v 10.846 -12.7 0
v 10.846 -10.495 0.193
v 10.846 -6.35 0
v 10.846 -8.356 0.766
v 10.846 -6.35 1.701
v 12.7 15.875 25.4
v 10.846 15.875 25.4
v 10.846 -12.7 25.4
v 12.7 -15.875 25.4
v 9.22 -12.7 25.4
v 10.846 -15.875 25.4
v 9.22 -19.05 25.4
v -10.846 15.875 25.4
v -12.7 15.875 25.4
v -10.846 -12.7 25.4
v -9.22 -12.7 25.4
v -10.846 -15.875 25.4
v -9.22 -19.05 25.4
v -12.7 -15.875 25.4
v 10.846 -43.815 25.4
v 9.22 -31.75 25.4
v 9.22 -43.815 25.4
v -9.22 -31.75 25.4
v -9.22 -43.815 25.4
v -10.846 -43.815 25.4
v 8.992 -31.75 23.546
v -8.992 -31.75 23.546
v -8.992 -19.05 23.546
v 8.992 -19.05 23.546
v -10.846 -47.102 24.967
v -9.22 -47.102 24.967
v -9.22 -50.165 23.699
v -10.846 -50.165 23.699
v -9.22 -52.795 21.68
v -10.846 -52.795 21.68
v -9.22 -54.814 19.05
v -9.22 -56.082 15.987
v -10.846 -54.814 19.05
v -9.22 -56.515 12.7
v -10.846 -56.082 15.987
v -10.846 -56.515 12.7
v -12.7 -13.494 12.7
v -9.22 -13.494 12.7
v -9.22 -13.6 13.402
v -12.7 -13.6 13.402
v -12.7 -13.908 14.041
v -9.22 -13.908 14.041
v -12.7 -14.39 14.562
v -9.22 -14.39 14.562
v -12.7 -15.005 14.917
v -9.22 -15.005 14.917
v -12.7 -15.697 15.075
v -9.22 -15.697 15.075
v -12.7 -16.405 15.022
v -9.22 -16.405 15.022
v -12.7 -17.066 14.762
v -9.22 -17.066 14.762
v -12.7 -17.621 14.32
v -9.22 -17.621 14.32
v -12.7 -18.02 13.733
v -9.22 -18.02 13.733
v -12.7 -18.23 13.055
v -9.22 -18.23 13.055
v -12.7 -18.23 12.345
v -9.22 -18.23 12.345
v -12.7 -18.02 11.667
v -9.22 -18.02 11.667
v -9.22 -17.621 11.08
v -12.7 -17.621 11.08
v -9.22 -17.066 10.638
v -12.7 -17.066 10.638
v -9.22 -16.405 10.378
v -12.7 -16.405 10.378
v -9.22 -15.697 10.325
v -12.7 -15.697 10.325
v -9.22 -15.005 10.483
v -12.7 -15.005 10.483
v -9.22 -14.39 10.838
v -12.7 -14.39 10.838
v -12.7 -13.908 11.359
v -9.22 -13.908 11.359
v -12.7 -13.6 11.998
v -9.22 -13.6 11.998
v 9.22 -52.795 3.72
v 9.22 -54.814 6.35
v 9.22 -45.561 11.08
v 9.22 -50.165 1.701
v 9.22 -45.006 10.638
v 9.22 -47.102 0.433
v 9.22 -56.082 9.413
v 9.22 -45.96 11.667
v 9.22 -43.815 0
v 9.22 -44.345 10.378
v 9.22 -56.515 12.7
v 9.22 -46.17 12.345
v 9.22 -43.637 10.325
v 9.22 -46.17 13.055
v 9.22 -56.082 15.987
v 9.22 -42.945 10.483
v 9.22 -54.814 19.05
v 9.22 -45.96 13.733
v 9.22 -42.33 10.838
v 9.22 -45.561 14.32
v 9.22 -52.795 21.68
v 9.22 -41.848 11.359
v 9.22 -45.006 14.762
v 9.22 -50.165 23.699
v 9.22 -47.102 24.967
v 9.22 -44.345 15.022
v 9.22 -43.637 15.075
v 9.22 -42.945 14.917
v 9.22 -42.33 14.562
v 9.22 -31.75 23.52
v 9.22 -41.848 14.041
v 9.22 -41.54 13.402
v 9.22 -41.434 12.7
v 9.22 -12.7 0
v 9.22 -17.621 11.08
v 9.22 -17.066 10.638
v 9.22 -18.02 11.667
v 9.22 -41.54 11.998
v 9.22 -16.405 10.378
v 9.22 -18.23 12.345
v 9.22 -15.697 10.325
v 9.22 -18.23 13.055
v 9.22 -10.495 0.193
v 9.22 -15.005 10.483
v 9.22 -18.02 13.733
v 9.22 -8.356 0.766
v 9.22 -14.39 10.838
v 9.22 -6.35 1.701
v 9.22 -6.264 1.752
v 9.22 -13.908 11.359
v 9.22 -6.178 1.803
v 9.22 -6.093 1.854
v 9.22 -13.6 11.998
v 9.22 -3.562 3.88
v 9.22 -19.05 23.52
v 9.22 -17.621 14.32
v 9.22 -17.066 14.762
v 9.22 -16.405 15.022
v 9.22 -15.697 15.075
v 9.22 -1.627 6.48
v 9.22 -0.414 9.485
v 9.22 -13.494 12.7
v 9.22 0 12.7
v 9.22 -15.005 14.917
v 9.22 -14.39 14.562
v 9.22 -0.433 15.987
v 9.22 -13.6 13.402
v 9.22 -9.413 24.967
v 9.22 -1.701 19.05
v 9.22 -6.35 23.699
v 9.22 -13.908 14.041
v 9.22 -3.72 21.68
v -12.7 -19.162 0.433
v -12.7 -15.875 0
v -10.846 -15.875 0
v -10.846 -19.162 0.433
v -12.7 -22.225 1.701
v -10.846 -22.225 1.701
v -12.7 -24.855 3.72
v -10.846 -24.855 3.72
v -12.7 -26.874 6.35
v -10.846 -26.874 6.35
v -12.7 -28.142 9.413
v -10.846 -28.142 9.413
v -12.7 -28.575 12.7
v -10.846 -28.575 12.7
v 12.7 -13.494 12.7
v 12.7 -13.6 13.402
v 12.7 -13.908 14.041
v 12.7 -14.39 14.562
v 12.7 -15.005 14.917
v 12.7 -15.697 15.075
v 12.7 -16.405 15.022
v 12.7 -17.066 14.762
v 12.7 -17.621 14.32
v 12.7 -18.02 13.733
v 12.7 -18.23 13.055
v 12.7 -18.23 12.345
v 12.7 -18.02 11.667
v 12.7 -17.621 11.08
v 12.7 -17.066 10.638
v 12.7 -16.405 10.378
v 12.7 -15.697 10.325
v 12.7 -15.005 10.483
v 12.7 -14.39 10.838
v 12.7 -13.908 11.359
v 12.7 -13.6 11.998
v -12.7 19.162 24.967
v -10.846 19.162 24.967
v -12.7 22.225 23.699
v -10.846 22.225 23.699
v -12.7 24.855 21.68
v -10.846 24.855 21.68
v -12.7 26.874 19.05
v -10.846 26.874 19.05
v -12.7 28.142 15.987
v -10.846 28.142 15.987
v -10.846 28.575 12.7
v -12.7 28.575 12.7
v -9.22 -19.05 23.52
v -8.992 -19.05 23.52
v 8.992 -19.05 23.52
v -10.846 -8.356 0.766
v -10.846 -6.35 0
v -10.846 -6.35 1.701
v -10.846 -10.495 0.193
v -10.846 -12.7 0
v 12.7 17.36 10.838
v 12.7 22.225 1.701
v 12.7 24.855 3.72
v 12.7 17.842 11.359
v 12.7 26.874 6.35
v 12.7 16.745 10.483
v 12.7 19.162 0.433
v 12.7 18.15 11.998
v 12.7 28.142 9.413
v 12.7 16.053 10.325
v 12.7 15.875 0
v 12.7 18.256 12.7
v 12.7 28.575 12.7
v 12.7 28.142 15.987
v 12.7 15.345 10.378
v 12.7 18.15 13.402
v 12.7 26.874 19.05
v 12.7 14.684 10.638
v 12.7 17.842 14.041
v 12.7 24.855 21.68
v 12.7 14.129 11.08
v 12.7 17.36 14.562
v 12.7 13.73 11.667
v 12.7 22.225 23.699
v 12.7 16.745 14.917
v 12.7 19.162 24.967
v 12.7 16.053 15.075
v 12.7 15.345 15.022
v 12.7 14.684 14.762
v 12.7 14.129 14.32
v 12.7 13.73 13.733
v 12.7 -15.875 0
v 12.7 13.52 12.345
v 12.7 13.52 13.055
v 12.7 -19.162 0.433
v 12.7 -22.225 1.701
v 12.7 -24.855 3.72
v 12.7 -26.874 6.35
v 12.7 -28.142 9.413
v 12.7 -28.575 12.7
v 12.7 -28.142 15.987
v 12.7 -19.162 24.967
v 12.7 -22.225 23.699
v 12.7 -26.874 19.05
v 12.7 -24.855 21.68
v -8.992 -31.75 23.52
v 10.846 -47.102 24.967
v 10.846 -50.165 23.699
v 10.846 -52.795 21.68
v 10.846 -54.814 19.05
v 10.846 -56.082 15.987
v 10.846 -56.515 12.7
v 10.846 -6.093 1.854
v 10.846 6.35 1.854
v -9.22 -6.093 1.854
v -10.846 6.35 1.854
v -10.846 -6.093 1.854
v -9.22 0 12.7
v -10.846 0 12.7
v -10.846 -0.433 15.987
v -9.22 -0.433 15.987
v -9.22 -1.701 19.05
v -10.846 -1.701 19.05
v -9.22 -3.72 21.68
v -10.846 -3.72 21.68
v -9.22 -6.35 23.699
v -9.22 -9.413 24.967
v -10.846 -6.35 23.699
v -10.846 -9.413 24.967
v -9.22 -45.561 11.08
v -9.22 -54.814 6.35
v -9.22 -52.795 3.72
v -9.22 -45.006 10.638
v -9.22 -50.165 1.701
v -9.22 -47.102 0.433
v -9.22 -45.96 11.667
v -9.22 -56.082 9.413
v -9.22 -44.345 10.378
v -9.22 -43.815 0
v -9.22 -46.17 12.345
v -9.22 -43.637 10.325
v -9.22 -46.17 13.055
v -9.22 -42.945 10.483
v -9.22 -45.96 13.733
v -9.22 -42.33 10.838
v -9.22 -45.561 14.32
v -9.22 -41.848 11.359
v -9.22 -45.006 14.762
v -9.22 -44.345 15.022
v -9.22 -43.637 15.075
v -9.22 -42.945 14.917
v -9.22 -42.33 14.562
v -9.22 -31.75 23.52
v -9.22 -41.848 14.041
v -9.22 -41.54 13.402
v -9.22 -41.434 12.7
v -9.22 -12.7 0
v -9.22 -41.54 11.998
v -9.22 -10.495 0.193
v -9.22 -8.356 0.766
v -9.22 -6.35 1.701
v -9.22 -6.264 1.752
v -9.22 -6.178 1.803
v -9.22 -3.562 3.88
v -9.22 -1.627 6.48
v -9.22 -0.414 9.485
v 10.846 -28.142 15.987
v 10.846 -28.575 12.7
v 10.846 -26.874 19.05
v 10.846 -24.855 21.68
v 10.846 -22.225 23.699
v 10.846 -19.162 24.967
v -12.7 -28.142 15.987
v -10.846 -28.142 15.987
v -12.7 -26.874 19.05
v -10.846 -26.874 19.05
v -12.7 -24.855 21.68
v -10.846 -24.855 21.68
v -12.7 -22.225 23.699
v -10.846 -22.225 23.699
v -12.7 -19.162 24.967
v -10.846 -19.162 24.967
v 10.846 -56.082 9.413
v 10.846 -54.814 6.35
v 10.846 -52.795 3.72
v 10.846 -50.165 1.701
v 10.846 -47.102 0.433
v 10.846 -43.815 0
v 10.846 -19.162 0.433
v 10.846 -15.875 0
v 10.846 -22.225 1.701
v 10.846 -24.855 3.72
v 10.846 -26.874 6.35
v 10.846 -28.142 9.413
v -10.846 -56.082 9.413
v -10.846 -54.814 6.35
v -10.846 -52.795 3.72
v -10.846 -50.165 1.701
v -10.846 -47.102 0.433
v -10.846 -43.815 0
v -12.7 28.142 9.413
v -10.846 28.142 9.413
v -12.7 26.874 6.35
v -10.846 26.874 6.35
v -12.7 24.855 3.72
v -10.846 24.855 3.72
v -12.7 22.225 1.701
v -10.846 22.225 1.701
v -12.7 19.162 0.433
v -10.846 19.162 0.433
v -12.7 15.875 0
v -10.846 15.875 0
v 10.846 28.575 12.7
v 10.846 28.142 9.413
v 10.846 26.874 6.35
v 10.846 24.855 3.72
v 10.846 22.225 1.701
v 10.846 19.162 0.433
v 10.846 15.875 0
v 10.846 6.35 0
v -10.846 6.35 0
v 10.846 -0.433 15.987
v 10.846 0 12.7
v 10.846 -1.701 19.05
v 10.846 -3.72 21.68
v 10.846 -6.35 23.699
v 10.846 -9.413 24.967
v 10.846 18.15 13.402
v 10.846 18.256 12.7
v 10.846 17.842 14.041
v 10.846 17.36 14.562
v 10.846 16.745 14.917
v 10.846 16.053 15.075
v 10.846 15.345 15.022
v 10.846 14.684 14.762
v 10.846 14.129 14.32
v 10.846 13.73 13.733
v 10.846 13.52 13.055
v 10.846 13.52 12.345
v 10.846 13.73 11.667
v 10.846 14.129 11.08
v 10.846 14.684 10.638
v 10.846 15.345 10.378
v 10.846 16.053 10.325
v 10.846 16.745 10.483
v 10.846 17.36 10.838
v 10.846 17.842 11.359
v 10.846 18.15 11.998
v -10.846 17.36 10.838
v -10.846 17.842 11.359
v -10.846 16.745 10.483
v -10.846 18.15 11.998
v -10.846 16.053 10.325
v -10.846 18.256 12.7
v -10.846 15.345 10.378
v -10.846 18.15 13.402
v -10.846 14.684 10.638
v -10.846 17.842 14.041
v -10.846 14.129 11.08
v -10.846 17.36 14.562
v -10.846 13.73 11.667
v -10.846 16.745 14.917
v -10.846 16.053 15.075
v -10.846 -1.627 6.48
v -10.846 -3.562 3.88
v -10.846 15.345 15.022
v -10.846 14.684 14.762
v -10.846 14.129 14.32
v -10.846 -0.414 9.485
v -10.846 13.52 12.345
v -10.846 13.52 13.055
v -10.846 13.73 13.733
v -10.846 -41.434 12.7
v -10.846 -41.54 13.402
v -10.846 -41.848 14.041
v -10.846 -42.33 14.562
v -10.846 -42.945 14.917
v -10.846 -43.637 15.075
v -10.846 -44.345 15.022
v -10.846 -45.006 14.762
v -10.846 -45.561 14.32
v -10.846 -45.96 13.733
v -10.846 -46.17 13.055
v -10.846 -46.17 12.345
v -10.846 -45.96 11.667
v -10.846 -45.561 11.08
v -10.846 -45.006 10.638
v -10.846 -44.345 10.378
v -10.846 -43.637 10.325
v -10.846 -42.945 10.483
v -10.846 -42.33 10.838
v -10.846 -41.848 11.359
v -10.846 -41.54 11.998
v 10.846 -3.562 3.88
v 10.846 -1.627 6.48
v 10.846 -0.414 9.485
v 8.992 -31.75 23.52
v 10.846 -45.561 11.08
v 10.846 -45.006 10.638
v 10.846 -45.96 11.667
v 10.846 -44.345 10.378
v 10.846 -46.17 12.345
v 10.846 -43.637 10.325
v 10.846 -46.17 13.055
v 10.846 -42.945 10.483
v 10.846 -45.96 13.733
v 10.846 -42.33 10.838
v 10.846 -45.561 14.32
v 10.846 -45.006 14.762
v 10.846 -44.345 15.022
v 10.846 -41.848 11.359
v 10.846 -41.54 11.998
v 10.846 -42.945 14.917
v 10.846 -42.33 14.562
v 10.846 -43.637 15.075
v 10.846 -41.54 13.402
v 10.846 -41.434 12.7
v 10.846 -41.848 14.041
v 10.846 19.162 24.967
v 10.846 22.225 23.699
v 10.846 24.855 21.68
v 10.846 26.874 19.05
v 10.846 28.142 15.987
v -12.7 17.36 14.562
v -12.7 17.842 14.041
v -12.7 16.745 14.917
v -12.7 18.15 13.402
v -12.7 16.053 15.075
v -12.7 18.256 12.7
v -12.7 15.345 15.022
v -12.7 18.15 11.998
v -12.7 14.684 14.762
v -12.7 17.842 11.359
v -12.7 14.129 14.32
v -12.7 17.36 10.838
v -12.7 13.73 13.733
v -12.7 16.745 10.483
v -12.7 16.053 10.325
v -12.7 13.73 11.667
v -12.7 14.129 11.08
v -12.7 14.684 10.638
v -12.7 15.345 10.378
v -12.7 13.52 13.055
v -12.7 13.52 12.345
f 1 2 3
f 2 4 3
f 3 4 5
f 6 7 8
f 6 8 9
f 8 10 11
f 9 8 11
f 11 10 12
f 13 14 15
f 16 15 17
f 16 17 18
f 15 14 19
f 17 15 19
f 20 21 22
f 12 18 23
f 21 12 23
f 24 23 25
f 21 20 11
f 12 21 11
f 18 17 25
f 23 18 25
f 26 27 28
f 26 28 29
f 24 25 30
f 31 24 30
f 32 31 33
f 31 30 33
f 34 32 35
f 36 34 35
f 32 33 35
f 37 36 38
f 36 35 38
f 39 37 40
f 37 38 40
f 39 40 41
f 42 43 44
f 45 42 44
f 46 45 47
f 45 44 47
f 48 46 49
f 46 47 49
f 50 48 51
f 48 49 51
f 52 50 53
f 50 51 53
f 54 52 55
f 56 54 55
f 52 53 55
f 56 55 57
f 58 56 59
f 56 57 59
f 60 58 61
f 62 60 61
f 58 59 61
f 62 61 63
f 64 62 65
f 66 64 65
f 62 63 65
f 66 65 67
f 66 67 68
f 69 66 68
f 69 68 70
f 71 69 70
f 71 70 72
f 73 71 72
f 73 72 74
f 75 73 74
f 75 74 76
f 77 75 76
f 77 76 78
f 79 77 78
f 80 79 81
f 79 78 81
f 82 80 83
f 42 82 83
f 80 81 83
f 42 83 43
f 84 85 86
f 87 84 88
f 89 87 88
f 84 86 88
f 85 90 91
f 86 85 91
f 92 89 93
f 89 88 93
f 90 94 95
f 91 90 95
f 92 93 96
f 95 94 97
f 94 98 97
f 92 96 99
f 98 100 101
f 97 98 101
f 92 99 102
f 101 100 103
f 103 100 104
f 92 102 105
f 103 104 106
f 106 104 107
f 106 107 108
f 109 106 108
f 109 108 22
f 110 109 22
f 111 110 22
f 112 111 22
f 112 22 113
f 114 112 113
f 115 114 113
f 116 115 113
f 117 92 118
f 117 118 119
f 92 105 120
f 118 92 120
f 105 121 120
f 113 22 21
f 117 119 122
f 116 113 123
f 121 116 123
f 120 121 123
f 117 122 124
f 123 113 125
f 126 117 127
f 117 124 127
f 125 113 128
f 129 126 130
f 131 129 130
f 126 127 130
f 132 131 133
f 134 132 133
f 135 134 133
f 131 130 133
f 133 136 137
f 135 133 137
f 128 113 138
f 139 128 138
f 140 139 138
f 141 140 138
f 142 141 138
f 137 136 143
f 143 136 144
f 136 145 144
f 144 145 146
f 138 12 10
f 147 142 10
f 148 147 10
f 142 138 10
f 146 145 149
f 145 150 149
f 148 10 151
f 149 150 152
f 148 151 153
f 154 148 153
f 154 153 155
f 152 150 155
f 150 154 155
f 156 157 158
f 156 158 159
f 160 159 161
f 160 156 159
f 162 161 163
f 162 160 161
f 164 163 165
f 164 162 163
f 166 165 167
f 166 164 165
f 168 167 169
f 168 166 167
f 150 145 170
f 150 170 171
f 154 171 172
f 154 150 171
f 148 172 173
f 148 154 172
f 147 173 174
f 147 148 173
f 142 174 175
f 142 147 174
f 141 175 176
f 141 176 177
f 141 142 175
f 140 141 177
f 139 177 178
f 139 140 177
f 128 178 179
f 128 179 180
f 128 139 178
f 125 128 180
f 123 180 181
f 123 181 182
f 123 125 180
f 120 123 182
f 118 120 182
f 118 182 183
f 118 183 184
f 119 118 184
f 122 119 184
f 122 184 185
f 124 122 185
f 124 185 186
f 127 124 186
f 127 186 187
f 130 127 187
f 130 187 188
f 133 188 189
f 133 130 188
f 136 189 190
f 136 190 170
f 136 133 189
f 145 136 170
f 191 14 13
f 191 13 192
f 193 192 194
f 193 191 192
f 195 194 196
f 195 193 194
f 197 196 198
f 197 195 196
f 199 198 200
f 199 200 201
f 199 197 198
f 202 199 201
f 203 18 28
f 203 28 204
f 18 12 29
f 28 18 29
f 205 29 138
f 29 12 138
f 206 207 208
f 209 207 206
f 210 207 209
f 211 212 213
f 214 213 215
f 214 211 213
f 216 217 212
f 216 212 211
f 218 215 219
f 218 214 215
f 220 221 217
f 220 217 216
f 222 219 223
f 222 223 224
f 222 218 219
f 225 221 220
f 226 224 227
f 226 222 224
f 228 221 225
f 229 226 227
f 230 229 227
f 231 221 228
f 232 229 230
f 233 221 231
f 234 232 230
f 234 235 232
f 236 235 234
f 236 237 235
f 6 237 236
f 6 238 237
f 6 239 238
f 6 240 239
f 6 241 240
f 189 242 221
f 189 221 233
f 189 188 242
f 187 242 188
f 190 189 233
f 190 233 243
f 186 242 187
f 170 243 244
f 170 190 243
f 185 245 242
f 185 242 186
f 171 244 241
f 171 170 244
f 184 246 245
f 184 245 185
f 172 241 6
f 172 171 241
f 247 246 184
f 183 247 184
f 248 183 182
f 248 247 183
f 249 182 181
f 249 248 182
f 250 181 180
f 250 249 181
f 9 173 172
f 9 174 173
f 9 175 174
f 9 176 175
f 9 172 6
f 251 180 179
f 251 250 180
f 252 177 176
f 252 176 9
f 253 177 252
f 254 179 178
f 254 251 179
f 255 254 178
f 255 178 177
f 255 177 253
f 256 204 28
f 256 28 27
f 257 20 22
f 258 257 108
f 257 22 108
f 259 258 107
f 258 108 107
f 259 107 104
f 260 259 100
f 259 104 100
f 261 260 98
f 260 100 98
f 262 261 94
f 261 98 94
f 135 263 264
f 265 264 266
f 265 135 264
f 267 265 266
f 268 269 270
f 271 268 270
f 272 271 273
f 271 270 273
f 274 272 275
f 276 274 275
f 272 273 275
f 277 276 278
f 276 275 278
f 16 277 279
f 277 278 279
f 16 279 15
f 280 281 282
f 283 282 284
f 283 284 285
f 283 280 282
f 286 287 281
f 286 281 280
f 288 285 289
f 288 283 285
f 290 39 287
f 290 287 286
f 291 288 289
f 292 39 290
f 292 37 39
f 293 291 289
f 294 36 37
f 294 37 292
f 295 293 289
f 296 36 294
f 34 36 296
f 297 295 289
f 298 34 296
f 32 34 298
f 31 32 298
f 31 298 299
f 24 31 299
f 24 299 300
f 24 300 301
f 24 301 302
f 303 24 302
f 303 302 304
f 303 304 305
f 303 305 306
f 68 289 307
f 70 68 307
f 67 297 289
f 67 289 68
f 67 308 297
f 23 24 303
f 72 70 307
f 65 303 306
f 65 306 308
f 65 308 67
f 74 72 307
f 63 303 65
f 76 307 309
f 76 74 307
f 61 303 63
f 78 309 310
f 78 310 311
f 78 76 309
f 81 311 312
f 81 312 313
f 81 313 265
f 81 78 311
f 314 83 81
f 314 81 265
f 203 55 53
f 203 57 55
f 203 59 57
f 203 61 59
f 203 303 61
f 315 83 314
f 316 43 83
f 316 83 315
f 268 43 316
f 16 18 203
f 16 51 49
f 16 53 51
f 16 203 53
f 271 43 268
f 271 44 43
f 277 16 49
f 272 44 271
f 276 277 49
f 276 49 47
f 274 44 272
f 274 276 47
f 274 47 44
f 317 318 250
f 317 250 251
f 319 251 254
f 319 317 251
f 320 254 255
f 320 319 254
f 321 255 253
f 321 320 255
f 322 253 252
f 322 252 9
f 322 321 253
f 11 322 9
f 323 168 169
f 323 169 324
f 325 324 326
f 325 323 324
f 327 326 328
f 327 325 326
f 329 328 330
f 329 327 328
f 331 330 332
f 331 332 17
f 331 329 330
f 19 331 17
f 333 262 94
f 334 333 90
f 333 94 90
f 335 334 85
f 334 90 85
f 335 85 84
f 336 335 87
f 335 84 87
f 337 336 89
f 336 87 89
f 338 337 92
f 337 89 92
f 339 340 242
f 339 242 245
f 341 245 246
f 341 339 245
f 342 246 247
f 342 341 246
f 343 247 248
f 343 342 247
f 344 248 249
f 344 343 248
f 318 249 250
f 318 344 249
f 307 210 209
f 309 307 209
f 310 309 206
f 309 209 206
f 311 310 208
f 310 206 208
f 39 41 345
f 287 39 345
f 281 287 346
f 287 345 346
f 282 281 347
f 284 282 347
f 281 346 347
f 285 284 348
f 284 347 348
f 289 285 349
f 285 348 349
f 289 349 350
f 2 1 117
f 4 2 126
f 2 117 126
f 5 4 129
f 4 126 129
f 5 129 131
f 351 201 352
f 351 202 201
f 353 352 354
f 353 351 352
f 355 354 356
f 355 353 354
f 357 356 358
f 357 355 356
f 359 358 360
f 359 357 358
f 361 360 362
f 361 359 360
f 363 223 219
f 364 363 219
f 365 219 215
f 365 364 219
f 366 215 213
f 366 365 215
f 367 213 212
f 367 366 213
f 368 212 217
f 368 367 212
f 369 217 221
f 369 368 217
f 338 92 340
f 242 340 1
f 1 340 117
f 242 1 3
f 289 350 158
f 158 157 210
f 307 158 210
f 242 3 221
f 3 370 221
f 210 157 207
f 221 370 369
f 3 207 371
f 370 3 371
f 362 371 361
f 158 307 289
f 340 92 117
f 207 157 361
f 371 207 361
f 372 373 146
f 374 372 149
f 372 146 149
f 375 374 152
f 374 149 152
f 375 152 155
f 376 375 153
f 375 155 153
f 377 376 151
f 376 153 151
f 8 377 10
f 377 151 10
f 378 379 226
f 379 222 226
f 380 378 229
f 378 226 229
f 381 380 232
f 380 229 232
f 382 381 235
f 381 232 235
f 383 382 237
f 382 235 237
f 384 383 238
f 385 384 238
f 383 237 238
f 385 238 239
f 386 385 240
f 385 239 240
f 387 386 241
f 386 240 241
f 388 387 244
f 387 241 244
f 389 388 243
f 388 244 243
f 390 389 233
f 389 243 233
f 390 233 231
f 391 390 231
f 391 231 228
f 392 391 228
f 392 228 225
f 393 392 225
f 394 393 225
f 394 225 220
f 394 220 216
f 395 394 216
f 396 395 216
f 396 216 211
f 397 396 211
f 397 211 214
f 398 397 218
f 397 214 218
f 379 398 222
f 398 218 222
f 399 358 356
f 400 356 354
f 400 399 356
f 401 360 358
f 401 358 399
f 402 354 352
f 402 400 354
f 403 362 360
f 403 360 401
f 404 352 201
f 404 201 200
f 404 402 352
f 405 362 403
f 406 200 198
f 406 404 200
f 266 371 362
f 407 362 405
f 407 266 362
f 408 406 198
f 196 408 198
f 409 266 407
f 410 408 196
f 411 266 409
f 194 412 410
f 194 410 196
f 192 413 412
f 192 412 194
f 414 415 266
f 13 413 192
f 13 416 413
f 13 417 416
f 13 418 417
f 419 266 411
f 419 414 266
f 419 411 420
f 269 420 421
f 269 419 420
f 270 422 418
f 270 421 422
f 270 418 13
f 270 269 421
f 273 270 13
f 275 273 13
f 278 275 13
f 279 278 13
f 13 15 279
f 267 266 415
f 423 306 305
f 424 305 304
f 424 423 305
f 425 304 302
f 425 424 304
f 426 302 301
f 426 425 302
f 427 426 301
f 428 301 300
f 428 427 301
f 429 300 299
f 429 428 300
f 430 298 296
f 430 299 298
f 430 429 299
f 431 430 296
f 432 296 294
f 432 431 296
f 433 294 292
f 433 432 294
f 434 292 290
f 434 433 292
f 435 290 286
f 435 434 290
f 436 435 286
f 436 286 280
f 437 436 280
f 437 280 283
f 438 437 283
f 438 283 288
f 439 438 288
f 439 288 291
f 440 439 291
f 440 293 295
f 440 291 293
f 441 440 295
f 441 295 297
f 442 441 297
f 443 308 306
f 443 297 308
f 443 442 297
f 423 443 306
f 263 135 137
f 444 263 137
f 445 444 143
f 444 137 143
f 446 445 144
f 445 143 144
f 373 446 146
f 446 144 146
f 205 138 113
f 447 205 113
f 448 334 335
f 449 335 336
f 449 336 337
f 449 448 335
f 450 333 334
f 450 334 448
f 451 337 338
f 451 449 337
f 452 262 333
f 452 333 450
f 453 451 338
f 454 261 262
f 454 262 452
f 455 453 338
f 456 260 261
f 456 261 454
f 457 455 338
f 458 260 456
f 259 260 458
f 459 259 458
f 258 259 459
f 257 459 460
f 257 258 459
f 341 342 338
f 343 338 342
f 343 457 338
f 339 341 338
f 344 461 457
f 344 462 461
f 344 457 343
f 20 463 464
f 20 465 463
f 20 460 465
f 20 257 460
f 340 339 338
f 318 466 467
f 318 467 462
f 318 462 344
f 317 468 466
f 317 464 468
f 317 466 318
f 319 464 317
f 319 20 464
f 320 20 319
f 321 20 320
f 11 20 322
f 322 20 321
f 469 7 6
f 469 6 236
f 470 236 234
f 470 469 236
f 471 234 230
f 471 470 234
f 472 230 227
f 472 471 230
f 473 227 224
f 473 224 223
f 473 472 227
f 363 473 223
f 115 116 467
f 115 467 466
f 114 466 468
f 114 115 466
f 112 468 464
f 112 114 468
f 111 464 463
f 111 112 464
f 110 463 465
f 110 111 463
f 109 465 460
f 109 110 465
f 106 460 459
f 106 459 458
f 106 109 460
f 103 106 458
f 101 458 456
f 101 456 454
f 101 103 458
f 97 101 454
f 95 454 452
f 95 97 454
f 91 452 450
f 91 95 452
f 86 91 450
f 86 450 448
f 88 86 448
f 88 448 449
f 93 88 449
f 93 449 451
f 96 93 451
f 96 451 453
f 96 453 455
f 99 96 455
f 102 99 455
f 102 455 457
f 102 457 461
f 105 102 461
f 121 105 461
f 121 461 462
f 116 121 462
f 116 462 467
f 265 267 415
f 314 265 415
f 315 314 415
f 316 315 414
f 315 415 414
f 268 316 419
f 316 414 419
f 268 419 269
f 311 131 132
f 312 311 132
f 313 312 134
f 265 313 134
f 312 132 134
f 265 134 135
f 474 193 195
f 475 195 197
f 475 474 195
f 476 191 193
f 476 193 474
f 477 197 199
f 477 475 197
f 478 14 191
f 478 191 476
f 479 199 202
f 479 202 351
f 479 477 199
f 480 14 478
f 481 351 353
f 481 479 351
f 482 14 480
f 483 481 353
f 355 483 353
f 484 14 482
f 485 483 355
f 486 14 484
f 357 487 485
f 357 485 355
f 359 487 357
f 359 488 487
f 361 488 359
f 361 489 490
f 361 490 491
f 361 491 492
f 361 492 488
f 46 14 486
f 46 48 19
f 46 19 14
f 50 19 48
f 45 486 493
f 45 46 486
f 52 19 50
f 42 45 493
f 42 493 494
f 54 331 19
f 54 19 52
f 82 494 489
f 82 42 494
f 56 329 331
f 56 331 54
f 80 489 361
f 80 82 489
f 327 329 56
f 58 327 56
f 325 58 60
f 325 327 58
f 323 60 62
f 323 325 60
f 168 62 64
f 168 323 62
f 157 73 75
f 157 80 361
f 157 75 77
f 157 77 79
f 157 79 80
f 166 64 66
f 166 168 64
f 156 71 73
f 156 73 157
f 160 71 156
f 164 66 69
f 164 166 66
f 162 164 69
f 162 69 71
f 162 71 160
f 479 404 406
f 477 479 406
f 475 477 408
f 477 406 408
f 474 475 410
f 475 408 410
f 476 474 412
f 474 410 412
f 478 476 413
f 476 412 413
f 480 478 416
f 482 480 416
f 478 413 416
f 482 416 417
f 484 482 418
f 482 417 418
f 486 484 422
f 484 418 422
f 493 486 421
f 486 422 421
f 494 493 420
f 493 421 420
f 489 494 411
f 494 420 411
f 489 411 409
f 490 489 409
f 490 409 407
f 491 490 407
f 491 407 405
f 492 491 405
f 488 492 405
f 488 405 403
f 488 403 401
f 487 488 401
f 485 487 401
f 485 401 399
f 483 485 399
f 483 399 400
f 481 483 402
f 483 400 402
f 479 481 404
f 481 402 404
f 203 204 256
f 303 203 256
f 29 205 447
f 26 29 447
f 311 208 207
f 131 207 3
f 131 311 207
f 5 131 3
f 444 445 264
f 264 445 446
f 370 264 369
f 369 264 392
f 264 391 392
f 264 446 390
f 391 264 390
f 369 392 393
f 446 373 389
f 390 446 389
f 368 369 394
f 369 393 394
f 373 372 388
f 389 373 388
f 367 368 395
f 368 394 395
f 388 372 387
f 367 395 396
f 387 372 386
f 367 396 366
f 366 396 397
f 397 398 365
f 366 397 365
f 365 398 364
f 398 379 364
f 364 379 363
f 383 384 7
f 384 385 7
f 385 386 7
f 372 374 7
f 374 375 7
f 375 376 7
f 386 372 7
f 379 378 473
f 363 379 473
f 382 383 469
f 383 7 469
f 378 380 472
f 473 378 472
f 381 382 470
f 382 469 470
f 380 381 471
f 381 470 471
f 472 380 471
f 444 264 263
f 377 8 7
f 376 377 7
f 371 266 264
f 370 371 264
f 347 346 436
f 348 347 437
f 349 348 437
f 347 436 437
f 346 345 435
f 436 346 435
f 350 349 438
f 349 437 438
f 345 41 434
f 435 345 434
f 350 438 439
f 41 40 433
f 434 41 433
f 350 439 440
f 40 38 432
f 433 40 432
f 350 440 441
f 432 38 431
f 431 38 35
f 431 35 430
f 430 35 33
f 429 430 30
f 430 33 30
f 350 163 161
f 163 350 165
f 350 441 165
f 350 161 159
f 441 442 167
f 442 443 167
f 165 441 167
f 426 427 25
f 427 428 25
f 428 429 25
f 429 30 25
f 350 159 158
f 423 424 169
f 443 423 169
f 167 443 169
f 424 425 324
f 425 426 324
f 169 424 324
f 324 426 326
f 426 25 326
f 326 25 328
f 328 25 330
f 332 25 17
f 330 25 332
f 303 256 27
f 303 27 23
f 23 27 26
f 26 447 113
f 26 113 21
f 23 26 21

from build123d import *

# Parameters (mm, degrees)
F1_DEPTH  = 28.575
F2_R      = 2.38125
F3_DEPTH  = 12.7
F4_W      = 21.6915998608
F4_H      = 22.372465115
F4_H_2    = 22.0895758063
F5_DEPTH  = 11.176
F6_R      = 2.38125
F7_DEPTH  = 21.6915998608
F8_W      = 17.9831998608
F8_H      = 49.9544155288
F9_DEPTH  = 23.5458
F11_DEPTH = 9.2202


with BuildPart() as f1:
    # F0 (on Front) → F1 (new body, symmetric)
    with BuildSketch(Plane.XZ):
        Polygon((-12.7, 25.4), (-12.7, 0), (12.7, 0), (12.7, 25.4), (10.8457999304, 25.4), (10.8457999304, 1.8542000696), (-10.8457999304, 1.8542000696), (-10.8457999304, 25.4), align=None)
    extrude(amount=F1_DEPTH, both=True)

    # F2 (on Right) → F3 (cut, symmetric)
    with BuildSketch(Plane.YZ):
        with BuildLine():
            ThreePointArc((15.875, 25.4), (24.8552561211, 21.6802561211), (28.575, 12.7))
            Line((28.575, 12.7), (28.575, 25.4))
            Line((28.575, 25.4), (15.875, 25.4))
        make_face()
        with BuildLine():
            ThreePointArc((28.575, 12.7), (24.8552561211, 3.7197438789), (15.875, 0))
            Line((15.875, 0), (28.575, 0))
            Line((28.575, 0), (28.575, 12.7))
        make_face()
        with BuildLine():
            ThreePointArc((-15.875, 0), (-24.8552561211, 3.7197438789), (-28.575, 12.7))
            Line((-28.575, 12.7), (-28.575, 0))
            Line((-28.575, 0), (-15.875, 0))
        make_face()
        with BuildLine():
            ThreePointArc((-28.575, 12.7), (-24.8552561211, 21.6802561211), (-15.875, 25.4))
            Line((-15.875, 25.4), (-28.575, 25.4))
            Line((-28.575, 25.4), (-28.575, 12.7))
        make_face()
        with Locations((-15.875, 12.7)):
            Circle(F2_R)
        with Locations((15.875, 12.7)):
            Circle(F2_R)
    extrude(amount=F3_DEPTH, both=True, mode=Mode.SUBTRACT)

    # F4 (on face) → F5 (cut)
    with BuildSketch(Plane.XY.offset(1.8542000696)):
        with Locations((0, 17.5362325575)):
            Rectangle(F4_W, F4_H)
        with Locations((0, -17.3947879031)):
            Rectangle(F4_W, F4_H_2)
    extrude(amount=-F5_DEPTH, mode=Mode.SUBTRACT)

    # F6 (on face) → F7 (join, through all)
    with BuildSketch(Plane.YZ.offset(-10.8457999304)):
        with BuildLine():
            Line((-12.7, 25.4), (-43.815, 25.4))
            ThreePointArc((-43.815, 25.4), (-52.7952561211, 21.6802561211), (-56.515, 12.7))
            ThreePointArc((-56.515, 12.7), (-52.7952561211, 3.7197438789), (-43.815, 0))
            Line((-43.815, 0), (-12.7, 0))
            ThreePointArc((-12.7, 0), (-3.7197438789, 3.7197438789), (0, 12.7))
            ThreePointArc((0, 12.7), (-3.7197438789, 21.6802561211), (-12.7, 25.4))
        make_face()
        with Locations((-43.815, 12.7)):
            Circle(F6_R, mode=Mode.SUBTRACT)
        with Locations((-15.875, 12.7)):
            Circle(F6_R, mode=Mode.SUBTRACT)
    extrude(amount=F7_DEPTH)

    # F8 (on face) → F9 (cut)
    with BuildSketch(Plane(origin=(0, 0, 0), x_dir=(1, 0, 0), z_dir=(0, 0, -1))):
        with Locations((0, 31.4859015796)):
            Rectangle(F8_W, F8_H)
    extrude(amount=-F9_DEPTH, mode=Mode.SUBTRACT)

    # F10 (on Right) → F11 (cut, symmetric)
    with BuildSketch(Plane.YZ):
        with BuildLine():
            Line((-31.75, 25.4), (-43.815, 25.4))
            ThreePointArc((-43.815, 25.4), (-56.515, 12.7), (-43.815, 0))
            Line((-43.815, 0), (-12.7, 0))
            ThreePointArc((-12.7, 0), (0, 12.7), (-12.7, 25.4))
            Line((-12.7, 25.4), (-19.05, 25.4))
            Line((-19.05, 25.4), (-19.05, 23.5204))
            Line((-19.05, 23.5204), (-31.75, 23.5204))
            Line((-31.75, 23.5204), (-31.75, 25.4))
        make_face()
    extrude(amount=F11_DEPTH, both=True, mode=Mode.SUBTRACT)


solid = f1.part
